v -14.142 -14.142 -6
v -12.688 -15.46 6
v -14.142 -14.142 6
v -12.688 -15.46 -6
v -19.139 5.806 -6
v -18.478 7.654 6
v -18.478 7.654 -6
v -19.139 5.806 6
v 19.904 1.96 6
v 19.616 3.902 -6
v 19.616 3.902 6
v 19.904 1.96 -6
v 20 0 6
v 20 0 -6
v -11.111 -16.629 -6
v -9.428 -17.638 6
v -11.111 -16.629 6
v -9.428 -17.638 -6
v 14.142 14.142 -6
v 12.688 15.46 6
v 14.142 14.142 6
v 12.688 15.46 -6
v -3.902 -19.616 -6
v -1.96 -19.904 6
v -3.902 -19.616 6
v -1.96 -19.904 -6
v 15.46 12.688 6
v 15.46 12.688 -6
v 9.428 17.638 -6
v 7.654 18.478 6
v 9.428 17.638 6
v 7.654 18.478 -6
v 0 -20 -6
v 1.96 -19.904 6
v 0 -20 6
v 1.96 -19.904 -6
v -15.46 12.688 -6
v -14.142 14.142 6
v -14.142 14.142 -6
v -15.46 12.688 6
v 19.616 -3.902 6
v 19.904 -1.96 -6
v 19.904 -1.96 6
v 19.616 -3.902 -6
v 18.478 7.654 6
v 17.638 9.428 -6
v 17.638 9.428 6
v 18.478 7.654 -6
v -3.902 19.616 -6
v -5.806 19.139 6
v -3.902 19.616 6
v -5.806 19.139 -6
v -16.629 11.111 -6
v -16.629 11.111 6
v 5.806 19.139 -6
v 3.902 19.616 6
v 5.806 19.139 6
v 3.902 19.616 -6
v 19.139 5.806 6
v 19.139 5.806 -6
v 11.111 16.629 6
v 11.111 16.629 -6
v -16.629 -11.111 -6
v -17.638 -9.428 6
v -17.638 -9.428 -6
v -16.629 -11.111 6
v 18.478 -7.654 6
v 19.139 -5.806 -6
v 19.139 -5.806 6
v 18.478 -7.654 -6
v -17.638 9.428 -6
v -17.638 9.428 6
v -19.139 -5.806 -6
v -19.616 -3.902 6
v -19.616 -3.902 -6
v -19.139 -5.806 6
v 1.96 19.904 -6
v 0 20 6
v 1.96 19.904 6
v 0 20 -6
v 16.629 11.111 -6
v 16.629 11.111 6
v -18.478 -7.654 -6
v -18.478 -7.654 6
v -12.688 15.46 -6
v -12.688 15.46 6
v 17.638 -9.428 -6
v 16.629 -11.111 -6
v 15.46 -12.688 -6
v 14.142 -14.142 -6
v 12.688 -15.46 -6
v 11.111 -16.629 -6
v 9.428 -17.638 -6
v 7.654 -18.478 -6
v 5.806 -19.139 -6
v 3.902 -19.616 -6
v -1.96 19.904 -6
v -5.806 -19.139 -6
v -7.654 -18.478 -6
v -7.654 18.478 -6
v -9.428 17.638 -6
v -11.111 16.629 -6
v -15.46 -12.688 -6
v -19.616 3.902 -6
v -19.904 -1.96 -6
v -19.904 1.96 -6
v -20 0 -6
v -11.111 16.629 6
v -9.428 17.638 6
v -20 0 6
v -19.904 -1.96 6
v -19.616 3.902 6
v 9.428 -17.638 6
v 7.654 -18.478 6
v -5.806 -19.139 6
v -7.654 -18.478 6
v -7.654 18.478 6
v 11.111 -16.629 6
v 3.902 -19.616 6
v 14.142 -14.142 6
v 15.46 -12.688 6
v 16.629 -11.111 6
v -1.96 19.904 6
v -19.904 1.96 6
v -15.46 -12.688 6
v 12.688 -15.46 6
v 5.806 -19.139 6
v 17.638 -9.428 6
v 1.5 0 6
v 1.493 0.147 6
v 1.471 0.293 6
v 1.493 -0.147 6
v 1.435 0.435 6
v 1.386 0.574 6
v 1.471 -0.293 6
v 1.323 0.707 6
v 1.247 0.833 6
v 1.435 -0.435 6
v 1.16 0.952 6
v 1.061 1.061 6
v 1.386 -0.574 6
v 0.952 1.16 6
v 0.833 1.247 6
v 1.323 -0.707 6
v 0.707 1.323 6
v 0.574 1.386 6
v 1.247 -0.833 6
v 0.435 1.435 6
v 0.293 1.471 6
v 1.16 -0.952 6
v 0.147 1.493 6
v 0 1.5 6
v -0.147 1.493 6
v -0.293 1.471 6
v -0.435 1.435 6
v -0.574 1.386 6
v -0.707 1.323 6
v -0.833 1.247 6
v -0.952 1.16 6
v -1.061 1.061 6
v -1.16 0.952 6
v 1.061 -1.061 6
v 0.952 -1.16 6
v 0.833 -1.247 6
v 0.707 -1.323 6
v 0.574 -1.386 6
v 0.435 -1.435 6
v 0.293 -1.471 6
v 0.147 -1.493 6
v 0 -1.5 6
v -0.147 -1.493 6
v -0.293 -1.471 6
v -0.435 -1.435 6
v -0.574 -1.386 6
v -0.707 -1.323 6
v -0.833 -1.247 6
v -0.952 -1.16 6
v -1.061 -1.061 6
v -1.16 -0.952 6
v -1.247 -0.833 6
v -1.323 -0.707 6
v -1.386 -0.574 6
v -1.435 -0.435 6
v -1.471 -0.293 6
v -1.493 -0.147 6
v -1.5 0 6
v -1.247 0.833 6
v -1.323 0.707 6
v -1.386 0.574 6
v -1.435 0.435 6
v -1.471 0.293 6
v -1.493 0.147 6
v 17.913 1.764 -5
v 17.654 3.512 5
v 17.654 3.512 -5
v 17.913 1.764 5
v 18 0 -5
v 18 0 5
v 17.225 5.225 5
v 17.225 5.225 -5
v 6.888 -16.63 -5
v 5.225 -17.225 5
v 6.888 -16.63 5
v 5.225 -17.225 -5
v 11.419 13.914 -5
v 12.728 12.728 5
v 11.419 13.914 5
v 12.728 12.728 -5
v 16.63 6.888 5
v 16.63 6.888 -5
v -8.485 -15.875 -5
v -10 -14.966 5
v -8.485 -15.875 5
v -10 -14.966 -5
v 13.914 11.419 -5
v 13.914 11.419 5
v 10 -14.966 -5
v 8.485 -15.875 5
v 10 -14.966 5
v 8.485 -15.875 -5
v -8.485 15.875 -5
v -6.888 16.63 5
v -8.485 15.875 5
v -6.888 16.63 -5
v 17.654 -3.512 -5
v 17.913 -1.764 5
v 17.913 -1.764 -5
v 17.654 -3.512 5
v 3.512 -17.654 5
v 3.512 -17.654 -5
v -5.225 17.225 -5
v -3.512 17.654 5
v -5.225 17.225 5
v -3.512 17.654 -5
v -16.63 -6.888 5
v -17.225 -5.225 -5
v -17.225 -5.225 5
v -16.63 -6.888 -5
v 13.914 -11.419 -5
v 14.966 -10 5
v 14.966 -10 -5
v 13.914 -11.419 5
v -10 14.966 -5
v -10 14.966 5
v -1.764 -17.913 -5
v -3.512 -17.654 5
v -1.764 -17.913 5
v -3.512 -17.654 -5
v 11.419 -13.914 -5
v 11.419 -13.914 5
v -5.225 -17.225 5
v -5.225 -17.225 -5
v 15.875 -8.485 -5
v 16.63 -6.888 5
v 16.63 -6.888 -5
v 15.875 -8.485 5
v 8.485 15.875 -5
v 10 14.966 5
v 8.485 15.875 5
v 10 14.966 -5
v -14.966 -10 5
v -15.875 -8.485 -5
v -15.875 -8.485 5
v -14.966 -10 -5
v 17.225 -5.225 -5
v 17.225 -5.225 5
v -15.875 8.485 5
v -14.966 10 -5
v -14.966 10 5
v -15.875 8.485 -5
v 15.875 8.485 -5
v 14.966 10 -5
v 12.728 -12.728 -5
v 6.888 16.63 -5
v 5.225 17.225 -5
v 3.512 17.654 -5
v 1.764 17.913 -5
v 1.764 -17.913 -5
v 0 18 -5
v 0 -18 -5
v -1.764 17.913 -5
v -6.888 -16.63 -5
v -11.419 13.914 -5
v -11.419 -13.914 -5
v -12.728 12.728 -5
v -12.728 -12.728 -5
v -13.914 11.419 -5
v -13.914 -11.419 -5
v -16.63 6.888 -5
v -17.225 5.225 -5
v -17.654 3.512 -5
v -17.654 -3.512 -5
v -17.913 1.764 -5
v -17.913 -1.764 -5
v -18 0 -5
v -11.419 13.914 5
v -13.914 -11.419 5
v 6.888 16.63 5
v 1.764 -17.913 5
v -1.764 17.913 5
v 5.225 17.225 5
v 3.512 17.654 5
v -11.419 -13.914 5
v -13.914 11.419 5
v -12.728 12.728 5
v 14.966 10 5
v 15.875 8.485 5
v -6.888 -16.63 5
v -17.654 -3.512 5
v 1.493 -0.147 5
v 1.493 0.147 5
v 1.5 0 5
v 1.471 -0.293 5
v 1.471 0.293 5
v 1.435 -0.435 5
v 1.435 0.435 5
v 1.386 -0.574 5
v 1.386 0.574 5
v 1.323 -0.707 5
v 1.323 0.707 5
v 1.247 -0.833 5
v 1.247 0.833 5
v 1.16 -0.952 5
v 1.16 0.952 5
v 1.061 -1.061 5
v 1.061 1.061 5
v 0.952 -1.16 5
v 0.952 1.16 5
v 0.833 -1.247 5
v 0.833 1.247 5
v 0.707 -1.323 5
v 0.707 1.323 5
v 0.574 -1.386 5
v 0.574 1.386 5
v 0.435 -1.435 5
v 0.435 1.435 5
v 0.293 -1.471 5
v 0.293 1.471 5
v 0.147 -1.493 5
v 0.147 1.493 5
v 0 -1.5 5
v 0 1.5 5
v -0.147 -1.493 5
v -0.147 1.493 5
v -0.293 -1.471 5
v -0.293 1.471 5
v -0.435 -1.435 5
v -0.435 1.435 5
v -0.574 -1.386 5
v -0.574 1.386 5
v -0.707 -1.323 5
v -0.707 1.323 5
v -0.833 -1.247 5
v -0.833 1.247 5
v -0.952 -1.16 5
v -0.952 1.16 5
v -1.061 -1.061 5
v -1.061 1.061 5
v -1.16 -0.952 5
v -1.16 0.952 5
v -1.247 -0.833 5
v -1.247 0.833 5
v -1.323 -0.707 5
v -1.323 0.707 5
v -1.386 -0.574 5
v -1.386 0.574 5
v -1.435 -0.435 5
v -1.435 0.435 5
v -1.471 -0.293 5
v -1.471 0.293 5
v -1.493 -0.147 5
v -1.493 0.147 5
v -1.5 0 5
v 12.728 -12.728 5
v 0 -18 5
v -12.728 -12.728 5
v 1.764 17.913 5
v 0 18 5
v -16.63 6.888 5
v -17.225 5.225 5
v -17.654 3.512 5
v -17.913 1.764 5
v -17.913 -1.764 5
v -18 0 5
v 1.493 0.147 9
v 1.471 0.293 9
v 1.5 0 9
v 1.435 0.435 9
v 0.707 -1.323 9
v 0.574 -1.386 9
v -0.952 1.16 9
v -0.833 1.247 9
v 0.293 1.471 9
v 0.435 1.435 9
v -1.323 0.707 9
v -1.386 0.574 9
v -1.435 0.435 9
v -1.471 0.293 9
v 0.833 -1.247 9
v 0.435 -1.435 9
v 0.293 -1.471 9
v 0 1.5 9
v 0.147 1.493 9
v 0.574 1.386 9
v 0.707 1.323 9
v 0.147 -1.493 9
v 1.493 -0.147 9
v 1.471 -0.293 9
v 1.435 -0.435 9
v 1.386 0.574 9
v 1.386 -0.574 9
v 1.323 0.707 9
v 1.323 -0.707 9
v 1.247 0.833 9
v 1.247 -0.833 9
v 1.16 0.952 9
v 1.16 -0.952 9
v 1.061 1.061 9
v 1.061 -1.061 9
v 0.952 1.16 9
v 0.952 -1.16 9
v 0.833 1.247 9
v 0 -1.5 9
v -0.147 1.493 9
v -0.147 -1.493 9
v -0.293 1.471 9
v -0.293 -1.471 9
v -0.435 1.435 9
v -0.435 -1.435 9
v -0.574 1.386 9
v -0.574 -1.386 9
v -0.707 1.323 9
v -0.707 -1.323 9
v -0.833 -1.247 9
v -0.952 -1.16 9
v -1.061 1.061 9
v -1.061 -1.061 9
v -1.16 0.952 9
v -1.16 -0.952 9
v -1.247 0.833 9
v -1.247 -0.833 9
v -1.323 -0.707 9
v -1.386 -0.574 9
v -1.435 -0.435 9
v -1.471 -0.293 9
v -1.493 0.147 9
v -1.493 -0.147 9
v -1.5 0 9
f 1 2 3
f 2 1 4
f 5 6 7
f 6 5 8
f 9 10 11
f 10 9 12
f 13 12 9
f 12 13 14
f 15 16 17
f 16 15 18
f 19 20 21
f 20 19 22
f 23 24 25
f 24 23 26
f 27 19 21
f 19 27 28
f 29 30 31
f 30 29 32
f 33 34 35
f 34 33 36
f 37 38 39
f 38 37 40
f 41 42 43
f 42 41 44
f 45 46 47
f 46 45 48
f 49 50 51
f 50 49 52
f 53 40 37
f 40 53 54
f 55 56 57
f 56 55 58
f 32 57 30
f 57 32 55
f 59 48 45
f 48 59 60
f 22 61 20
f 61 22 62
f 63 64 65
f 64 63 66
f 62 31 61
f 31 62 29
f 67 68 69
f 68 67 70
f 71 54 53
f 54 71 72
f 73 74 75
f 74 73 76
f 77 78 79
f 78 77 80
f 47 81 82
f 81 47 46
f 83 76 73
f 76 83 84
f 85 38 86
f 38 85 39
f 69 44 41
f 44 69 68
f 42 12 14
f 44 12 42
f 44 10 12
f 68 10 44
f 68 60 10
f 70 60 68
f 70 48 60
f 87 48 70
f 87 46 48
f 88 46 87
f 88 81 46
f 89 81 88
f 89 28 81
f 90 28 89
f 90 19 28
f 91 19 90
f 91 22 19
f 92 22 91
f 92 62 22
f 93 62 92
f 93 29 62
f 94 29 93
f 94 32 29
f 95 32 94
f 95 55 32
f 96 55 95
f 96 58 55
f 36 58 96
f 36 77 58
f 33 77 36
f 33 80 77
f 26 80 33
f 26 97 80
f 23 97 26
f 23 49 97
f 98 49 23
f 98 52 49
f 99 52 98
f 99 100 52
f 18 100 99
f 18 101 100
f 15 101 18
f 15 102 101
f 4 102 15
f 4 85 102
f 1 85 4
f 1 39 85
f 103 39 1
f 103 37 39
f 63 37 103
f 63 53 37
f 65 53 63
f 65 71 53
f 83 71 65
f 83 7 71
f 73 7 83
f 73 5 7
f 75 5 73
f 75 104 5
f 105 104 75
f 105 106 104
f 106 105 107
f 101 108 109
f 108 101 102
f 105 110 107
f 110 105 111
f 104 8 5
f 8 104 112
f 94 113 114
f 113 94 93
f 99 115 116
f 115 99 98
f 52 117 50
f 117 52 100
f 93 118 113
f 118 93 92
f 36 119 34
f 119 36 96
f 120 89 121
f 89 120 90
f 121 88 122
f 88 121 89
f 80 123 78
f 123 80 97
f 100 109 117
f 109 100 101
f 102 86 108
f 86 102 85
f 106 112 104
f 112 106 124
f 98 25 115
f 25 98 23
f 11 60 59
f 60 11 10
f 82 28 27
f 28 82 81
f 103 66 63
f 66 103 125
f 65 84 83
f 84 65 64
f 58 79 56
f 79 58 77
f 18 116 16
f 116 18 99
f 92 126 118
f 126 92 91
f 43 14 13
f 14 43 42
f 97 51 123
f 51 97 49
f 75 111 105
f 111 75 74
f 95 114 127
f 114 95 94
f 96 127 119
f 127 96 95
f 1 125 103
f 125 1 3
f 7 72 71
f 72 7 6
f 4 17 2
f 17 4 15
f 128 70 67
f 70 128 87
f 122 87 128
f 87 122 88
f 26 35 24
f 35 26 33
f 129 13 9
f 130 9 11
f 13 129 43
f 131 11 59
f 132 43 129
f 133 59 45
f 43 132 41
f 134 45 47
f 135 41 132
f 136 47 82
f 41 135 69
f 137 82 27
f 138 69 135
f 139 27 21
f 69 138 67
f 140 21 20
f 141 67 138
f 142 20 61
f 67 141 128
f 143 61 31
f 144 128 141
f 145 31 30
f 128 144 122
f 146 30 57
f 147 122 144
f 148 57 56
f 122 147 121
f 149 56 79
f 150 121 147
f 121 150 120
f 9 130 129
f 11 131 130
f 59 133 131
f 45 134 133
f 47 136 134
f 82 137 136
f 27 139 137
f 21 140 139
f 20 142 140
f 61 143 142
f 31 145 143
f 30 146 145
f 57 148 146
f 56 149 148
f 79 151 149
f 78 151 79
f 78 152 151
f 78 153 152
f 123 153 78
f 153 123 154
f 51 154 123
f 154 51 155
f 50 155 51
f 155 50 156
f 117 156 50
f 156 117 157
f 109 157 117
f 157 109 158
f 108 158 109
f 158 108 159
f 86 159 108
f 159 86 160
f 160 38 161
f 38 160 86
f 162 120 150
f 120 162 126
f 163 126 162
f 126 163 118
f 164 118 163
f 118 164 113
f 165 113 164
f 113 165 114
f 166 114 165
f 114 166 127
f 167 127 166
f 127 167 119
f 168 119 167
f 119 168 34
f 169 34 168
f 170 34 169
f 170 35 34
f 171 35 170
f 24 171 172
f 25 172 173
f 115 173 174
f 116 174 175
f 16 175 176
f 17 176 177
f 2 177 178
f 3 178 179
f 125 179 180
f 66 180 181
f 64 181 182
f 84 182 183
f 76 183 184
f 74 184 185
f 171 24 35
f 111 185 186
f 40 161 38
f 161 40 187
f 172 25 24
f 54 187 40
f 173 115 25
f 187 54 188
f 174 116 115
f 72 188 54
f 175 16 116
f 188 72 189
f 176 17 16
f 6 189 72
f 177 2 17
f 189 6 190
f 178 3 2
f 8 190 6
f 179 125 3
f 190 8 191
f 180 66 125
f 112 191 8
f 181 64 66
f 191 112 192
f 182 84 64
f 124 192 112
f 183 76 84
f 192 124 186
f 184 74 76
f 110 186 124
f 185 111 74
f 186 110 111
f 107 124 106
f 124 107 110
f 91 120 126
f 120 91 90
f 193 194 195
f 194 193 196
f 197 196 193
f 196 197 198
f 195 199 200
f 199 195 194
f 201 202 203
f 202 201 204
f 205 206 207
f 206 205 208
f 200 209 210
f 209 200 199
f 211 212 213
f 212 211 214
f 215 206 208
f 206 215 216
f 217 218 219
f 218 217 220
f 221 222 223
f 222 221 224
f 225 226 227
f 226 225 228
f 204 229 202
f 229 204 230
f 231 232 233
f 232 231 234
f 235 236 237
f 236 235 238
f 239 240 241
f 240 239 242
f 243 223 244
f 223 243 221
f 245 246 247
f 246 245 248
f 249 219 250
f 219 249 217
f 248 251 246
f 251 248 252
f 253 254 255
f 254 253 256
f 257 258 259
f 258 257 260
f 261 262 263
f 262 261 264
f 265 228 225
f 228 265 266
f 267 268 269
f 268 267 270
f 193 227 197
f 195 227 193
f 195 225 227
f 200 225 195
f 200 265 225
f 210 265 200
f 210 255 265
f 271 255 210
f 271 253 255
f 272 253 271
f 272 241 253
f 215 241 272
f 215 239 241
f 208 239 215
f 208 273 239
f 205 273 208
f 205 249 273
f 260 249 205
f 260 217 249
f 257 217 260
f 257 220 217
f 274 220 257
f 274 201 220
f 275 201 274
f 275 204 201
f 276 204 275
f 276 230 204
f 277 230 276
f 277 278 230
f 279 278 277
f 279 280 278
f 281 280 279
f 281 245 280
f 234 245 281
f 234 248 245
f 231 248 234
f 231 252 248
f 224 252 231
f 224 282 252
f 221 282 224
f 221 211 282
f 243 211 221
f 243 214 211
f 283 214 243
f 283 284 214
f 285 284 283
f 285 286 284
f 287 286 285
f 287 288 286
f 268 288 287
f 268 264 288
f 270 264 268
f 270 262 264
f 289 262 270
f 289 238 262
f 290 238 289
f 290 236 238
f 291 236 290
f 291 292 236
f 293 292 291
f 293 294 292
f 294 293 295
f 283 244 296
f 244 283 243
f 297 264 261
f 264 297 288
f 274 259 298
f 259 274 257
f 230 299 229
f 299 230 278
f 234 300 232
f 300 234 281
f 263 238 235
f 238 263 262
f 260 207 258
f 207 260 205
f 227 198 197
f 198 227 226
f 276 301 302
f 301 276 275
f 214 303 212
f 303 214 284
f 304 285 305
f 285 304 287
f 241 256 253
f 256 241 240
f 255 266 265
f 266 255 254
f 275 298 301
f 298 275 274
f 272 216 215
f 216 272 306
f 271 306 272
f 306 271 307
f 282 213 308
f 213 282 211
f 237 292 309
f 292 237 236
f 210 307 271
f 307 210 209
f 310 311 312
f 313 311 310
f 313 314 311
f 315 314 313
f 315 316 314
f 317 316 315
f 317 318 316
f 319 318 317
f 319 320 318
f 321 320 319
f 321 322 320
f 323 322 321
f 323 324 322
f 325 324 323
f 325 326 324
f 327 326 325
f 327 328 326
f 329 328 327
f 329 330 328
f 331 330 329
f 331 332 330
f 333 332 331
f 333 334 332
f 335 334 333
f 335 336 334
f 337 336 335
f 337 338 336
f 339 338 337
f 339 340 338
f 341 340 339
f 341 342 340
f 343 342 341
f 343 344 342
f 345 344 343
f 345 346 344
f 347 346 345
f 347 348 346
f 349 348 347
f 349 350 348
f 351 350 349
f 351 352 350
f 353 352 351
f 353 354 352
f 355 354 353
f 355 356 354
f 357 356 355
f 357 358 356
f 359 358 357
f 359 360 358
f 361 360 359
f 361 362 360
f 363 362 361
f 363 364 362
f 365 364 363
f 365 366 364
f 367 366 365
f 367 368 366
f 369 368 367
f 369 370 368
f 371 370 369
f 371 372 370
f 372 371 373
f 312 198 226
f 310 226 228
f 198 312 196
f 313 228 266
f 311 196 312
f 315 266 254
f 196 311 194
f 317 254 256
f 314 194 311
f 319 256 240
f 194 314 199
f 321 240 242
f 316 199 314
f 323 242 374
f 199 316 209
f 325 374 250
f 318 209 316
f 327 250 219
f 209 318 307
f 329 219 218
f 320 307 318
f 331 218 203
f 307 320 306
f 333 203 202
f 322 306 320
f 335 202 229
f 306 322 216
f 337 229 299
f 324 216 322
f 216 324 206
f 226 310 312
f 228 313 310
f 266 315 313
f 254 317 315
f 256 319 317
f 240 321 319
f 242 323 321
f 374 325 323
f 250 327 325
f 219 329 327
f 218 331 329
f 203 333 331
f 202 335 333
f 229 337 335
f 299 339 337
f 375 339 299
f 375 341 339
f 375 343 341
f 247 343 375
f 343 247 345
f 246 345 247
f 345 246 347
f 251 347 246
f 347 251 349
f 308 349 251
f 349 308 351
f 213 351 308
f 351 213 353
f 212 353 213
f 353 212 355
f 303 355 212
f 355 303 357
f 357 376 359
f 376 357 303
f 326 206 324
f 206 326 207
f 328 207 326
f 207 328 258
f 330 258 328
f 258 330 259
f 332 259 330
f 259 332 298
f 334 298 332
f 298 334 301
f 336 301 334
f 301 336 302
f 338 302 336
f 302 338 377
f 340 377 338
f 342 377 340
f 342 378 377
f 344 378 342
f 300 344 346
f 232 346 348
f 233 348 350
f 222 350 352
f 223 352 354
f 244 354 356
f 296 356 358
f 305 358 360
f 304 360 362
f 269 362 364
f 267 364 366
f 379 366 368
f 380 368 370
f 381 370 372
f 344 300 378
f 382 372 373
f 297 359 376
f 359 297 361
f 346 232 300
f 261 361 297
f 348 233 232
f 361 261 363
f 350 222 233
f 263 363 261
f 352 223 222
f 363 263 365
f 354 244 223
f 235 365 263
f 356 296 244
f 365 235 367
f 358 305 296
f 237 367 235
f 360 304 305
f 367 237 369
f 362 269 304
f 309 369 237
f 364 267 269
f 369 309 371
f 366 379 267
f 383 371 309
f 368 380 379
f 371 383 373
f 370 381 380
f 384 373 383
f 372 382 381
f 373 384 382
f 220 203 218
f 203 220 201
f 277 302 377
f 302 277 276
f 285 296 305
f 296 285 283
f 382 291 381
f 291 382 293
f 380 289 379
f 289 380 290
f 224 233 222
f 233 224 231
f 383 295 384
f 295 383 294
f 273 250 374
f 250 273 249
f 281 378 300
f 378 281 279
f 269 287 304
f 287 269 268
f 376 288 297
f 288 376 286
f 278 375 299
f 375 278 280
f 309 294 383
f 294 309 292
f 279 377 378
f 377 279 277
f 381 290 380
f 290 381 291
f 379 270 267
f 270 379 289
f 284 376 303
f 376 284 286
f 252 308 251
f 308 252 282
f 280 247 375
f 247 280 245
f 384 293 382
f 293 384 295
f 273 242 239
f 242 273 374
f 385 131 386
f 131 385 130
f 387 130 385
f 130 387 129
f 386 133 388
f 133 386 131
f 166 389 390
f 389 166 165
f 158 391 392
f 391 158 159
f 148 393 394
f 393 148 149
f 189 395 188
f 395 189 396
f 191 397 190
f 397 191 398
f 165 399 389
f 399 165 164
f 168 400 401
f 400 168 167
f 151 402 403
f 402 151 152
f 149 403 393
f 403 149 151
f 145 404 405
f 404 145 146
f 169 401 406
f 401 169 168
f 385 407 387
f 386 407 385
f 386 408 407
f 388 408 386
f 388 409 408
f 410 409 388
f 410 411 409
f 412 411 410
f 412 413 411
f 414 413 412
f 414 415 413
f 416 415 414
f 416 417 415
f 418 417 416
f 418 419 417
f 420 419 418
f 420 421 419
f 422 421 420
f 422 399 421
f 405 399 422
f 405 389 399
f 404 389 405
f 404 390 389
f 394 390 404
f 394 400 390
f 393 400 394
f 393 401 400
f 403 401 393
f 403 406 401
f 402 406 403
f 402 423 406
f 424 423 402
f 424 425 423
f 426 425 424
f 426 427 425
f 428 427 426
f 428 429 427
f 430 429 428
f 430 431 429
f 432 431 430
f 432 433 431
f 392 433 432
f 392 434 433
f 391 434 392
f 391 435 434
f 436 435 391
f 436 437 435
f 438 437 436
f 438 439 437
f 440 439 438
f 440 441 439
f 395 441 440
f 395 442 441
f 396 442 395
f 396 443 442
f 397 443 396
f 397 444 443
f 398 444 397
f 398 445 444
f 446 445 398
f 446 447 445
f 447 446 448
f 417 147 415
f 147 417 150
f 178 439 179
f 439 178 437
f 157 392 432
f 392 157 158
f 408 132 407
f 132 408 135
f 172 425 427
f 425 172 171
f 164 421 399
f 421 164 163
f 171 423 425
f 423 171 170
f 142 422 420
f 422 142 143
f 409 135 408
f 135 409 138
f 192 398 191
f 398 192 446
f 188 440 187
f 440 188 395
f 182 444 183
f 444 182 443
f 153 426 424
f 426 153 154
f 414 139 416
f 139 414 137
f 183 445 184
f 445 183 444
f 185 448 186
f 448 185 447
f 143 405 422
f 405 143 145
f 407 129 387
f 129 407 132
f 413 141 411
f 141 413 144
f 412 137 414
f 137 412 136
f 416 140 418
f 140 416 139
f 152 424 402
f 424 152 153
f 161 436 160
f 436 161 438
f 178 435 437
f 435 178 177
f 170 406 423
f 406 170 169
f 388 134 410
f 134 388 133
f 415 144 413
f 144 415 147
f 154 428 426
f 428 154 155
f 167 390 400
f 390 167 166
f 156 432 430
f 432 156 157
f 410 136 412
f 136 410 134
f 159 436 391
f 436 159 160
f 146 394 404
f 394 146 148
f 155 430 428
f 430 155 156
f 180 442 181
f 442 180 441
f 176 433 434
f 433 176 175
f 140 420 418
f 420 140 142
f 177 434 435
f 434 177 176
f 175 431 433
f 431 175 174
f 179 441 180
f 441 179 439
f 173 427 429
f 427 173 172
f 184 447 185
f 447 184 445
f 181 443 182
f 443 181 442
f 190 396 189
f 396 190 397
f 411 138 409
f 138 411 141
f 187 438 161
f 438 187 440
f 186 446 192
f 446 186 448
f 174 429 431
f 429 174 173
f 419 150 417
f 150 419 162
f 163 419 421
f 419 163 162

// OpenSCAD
// АкустикМон-6 — Носимый модуль
$fn = 64;
module main_body() {
    difference() {
        cylinder(d=40, h=12, center=true);
        cylinder(d=36, h=10, center=true);
    }
}
module mic_hole() {
    translate([0,0,5]) cylinder(d=3, h=4);
}
module assembly() {
    main_body();
    mic_hole();
}
assembly();
